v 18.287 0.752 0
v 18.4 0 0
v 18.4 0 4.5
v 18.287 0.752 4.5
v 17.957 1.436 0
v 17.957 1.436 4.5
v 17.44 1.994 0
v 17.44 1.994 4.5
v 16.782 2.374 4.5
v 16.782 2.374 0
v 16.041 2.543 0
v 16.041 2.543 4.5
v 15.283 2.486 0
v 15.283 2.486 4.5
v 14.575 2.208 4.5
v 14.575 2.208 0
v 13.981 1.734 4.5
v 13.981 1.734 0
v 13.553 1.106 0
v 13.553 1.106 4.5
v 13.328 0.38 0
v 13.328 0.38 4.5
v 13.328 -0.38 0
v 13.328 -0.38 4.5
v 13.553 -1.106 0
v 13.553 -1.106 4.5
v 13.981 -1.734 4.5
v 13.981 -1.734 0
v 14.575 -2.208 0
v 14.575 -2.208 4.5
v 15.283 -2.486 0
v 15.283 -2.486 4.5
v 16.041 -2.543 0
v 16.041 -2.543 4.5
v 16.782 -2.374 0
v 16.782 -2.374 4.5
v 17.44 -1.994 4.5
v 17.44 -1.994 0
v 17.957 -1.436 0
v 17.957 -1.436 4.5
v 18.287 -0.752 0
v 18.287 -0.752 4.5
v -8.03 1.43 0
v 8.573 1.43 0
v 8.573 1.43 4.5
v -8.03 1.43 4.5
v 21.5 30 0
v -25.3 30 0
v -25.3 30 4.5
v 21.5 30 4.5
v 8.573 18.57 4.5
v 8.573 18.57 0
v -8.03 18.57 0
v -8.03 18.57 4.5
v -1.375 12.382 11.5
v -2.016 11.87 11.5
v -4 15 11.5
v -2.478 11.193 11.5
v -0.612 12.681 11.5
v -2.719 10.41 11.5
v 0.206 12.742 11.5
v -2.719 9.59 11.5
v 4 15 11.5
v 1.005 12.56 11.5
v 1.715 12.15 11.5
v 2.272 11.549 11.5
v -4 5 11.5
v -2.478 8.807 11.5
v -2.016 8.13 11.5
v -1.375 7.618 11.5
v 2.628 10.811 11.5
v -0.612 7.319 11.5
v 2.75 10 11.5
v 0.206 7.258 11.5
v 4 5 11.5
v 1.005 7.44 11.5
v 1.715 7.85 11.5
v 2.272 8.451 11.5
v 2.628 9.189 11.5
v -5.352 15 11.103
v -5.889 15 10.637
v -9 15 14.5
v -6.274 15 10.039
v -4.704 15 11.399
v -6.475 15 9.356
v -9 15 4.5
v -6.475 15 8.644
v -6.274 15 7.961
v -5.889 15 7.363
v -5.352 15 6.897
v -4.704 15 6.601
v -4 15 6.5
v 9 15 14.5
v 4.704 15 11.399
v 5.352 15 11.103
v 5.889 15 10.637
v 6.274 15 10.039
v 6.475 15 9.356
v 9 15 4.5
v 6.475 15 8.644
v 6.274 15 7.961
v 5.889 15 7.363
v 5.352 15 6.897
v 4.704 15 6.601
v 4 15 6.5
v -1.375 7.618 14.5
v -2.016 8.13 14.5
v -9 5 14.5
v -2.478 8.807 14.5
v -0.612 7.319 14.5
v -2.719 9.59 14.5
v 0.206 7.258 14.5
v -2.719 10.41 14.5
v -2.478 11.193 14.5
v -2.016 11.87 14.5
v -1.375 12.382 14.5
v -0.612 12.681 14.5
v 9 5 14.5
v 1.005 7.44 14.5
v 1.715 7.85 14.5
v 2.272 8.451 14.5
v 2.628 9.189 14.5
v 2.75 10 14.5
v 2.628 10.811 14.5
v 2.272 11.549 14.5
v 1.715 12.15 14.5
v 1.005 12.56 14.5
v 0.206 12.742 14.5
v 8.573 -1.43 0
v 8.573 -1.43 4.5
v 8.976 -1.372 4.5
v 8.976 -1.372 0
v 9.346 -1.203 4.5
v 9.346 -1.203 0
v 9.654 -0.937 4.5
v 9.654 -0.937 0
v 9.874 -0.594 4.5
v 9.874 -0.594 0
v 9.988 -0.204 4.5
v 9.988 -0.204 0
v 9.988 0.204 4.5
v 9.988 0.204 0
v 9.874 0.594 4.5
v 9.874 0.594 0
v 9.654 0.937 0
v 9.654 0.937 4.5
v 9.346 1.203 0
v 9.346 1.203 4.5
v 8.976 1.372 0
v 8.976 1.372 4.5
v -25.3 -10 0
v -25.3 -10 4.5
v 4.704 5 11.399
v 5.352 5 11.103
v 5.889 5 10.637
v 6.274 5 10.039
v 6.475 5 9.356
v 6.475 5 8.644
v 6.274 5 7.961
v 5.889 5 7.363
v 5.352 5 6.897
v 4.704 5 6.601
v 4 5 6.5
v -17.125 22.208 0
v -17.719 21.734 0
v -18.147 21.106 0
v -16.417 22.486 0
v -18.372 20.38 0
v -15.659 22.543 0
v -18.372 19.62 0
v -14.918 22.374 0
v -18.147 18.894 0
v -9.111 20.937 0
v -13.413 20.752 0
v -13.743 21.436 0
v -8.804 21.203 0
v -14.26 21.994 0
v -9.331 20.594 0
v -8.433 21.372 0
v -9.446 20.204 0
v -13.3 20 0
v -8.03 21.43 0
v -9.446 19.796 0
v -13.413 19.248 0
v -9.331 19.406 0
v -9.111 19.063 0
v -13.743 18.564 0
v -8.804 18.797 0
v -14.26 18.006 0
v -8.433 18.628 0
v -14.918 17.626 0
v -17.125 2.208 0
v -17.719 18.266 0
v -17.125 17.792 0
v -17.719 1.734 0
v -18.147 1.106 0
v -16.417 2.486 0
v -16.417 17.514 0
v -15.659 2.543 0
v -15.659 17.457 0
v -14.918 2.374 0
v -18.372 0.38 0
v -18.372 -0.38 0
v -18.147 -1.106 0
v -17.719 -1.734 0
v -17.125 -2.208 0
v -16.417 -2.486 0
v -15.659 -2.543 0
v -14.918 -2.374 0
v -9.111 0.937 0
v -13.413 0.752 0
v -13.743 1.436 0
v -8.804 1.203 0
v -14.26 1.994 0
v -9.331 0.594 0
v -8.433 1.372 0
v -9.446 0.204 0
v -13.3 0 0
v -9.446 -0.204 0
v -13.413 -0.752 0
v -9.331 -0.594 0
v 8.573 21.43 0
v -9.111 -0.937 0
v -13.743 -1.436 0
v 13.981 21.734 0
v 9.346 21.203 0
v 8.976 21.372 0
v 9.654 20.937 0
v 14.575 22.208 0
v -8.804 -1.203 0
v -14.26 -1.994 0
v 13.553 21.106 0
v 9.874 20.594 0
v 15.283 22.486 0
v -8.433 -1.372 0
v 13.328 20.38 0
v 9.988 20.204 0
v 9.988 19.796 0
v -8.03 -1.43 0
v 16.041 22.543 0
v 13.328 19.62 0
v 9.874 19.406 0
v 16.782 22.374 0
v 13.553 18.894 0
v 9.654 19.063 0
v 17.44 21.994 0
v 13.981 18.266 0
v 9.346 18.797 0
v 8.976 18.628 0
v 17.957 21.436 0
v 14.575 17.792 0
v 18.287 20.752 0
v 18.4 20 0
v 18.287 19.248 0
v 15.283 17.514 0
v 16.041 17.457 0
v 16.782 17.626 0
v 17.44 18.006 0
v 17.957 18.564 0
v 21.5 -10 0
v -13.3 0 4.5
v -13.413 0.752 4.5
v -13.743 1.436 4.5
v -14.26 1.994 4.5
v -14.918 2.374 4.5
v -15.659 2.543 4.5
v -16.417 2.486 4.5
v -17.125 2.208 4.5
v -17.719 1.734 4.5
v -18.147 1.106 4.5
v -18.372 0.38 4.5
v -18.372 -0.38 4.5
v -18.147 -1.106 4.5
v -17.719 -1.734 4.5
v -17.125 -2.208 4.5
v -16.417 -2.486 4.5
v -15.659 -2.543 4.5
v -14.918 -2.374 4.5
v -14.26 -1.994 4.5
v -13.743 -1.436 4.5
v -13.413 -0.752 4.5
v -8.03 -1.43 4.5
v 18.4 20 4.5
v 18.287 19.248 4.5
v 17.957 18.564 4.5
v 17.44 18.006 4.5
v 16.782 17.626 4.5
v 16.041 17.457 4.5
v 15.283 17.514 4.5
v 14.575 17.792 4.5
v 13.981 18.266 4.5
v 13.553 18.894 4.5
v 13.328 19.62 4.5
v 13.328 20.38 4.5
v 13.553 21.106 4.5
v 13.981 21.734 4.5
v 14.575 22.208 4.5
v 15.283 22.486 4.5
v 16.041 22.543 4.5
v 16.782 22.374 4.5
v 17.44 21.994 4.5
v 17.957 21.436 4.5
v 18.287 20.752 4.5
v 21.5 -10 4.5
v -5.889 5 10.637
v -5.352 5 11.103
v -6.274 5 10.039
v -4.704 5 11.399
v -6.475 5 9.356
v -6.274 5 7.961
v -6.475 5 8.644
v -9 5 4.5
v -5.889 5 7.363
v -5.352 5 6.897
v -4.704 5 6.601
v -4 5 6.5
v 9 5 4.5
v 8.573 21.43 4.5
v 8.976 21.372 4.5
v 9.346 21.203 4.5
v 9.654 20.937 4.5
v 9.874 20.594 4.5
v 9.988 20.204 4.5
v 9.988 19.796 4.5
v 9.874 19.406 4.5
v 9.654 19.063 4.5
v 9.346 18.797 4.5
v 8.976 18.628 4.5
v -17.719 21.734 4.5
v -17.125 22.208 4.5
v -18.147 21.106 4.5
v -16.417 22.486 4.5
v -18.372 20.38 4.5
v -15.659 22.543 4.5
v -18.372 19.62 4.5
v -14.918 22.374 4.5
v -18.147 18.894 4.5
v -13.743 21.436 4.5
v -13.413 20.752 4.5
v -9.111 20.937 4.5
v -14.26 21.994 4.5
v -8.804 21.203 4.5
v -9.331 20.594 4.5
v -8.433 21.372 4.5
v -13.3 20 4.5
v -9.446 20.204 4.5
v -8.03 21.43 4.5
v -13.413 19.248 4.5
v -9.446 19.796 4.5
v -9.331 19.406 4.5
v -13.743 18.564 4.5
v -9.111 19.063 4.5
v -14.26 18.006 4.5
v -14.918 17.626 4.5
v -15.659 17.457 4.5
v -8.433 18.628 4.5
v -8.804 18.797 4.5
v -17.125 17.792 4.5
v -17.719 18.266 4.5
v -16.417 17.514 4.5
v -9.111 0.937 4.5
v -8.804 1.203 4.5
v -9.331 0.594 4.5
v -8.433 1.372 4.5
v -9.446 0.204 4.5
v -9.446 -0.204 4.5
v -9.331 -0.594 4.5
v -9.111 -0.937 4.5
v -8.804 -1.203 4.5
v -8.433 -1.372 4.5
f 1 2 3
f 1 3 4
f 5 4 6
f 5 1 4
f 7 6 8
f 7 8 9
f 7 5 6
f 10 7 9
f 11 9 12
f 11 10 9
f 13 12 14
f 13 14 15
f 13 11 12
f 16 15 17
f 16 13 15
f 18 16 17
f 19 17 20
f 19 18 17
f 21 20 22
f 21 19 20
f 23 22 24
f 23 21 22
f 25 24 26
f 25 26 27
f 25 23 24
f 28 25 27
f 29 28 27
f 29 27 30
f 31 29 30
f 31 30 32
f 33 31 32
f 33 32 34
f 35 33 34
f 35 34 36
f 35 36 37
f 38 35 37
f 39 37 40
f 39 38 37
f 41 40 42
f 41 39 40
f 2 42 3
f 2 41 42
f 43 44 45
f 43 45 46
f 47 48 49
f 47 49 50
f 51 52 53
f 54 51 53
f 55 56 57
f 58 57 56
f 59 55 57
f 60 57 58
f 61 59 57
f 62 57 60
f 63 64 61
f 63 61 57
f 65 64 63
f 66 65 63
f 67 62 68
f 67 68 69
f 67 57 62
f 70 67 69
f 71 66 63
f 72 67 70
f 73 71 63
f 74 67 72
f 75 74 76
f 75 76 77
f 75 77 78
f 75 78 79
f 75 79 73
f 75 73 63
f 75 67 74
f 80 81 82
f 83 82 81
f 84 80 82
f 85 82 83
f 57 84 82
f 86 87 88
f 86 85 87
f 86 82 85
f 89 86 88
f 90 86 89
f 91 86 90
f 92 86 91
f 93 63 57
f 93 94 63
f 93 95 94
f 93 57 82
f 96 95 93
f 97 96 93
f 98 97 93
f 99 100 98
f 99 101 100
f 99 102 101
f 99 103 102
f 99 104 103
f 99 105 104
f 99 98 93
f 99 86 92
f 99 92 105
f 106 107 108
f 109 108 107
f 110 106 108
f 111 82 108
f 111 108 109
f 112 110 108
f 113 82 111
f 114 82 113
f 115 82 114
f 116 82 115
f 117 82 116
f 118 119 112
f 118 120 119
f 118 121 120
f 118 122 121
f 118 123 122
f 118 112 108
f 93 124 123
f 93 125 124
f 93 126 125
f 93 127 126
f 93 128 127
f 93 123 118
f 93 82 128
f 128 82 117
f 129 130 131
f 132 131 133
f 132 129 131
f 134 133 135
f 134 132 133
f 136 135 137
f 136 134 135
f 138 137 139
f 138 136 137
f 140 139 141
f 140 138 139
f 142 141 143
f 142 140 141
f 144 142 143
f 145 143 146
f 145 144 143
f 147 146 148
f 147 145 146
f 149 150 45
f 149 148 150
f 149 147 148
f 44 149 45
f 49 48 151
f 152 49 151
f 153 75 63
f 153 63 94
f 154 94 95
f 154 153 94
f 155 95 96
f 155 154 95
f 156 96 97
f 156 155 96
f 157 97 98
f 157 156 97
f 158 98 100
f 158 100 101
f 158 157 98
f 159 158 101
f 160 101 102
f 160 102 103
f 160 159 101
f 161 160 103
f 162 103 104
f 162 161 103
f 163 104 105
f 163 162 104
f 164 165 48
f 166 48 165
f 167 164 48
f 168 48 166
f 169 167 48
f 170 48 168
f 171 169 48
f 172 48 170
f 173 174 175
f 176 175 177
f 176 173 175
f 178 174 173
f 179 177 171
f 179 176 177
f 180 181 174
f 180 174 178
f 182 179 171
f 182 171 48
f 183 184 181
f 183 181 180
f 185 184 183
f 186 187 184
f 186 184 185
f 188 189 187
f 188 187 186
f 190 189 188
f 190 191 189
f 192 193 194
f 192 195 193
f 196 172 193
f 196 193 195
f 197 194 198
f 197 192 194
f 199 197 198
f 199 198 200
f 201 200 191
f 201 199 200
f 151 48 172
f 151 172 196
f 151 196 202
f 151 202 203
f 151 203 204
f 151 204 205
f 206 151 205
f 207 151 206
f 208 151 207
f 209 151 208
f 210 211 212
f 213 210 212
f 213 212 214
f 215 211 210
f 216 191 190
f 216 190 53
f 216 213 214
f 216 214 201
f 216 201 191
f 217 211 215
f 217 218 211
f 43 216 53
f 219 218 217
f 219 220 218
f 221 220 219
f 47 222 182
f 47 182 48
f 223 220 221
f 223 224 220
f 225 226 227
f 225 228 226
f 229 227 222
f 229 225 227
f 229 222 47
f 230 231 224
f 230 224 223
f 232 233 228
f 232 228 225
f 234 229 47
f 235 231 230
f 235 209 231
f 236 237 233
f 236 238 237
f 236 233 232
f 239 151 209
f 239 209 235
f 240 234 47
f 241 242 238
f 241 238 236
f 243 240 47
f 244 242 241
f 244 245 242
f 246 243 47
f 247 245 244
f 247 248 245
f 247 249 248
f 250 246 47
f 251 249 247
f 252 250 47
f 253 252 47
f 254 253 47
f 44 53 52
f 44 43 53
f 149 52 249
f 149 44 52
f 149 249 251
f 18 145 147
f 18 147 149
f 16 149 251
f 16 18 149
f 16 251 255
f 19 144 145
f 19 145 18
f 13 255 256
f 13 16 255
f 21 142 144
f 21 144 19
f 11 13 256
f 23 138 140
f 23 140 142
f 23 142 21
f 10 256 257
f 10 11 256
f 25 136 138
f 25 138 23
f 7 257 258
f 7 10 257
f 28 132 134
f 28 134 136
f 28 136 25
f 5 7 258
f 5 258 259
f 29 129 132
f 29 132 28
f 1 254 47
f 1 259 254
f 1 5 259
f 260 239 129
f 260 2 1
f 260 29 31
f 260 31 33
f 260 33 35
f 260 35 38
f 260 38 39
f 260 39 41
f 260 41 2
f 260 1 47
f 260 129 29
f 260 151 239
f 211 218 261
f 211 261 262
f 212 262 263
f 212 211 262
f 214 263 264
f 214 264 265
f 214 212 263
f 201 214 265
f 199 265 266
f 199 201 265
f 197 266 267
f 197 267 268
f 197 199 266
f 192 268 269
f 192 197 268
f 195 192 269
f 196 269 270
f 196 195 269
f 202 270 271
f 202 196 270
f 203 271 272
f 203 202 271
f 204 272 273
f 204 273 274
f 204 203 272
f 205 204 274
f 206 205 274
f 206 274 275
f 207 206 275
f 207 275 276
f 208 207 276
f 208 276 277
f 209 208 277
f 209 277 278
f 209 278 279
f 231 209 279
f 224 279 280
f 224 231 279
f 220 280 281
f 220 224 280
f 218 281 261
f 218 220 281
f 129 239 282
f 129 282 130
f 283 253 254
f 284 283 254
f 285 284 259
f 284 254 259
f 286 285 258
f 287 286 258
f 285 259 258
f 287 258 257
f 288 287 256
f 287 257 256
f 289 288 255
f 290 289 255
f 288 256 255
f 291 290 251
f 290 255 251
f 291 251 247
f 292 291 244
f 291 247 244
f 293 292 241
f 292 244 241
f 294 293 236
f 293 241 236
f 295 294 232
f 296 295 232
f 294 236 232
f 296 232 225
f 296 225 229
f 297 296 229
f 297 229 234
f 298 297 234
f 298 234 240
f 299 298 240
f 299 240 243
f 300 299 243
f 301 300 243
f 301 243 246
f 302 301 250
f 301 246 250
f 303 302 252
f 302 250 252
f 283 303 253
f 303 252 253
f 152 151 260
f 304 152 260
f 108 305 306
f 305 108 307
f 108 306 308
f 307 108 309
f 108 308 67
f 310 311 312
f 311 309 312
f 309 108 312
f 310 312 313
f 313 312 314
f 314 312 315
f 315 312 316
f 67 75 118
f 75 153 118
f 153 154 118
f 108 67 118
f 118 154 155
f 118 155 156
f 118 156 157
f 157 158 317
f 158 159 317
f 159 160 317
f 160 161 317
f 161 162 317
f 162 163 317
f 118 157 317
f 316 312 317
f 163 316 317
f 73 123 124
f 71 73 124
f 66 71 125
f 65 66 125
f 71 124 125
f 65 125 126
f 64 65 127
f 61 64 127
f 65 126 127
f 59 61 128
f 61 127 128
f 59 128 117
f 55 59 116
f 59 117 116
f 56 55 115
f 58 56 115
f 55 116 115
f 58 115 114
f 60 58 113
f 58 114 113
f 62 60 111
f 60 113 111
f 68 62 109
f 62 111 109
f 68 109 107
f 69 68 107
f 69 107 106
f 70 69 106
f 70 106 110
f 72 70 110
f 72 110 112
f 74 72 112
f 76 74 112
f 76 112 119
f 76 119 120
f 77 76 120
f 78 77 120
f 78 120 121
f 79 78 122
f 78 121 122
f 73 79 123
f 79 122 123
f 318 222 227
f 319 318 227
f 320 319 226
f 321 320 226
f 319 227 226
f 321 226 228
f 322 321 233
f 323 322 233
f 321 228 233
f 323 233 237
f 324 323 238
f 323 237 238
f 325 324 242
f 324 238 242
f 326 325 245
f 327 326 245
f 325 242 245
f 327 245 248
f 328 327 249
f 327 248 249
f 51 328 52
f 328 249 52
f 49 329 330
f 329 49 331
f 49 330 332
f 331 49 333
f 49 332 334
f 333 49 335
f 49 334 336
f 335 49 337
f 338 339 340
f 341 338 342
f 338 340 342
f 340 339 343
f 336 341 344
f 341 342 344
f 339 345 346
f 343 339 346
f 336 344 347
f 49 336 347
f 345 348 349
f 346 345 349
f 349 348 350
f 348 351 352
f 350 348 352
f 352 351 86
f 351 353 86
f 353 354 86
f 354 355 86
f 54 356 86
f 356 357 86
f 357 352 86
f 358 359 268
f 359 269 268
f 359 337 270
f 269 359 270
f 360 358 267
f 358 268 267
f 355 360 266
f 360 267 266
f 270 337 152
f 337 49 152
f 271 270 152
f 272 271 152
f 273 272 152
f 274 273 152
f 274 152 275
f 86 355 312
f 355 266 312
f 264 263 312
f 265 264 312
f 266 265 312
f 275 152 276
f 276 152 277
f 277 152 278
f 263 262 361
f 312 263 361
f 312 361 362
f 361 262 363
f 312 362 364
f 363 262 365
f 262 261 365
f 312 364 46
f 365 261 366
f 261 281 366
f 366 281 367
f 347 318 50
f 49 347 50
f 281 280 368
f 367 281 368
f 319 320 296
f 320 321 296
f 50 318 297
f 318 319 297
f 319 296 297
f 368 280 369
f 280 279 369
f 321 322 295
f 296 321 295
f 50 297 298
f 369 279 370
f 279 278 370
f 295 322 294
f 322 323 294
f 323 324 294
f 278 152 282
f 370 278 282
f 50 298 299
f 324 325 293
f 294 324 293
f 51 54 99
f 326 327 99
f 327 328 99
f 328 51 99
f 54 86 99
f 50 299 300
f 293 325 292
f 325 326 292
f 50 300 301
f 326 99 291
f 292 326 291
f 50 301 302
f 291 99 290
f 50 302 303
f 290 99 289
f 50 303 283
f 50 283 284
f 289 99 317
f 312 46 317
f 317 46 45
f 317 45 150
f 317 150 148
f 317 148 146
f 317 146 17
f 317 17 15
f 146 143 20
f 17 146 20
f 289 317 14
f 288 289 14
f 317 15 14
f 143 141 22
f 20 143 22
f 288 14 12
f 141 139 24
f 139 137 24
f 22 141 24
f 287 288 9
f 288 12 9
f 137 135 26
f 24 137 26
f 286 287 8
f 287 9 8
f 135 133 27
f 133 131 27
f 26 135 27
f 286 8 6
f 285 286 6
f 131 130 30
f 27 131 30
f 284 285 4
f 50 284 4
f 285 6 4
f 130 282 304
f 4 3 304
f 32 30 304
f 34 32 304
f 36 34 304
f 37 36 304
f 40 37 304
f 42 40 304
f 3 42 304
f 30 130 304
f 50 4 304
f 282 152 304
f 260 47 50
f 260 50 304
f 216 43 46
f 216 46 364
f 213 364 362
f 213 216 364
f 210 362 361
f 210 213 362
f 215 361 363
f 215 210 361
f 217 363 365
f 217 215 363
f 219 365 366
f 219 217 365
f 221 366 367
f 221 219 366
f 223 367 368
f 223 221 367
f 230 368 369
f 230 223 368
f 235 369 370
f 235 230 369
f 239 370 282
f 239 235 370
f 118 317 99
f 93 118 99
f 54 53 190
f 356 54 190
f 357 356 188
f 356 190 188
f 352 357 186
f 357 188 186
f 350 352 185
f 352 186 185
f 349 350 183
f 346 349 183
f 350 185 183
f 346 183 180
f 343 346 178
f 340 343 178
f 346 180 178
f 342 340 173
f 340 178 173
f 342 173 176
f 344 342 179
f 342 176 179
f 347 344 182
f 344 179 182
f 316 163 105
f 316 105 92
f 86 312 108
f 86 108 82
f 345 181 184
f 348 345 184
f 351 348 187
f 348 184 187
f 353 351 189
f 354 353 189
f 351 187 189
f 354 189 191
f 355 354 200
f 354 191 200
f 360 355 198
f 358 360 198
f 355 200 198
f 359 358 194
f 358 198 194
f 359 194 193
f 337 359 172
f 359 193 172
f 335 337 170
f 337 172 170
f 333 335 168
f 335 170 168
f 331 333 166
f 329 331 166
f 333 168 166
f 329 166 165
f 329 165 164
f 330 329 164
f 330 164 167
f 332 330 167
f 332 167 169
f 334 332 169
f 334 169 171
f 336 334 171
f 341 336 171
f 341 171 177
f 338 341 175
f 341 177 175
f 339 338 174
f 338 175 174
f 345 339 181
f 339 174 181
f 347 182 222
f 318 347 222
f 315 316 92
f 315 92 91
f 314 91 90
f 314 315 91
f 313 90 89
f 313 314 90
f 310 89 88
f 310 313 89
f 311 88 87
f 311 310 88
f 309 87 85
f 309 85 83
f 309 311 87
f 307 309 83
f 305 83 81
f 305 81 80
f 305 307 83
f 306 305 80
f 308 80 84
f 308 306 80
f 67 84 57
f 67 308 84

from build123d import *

# Parameters (mm, degrees)
SKETCH_1_W          = 46.8
SKETCH_1_H          = 20
SKETCH_1_R          = 2.55
EXTRUDE_1_DEPTH     = 4.5
CUT_EXTRUDE_1_DEPTH = 8
SKETCH_9_W          = 18
SKETCH_9_H          = 10
EXTRUDE_2_DEPTH     = 10
CUT_EXTRUDE_3_DEPTH = 10
SKETCH_12_R         = 2.75
CUT_EXTRUDE_4_DEPTH = 3


with BuildPart() as part:
    # 草图1 → 凸台-拉伸1 (new body)
    with BuildSketch(Plane.XY):
        with Locations((-1.9, 0)):
            Rectangle(SKETCH_1_W, SKETCH_1_H)
        with Locations((-15.85, 0)):
            Circle(SKETCH_1_R, mode=Mode.SUBTRACT)
        with Locations((15.85, 0)):
            Circle(SKETCH_1_R, mode=Mode.SUBTRACT)
    extrude_1 = extrude(amount=EXTRUDE_1_DEPTH)

    # 草图8 → 切除-拉伸1 (cut)
    with BuildSketch(Plane(origin=(0, 0, 0), x_dir=(-1, 0, 0), z_dir=(0, 0, -1))):
        with BuildLine():
            Line((-8.572541507, 1.430395913), (8.030268199, 1.430395913))
            ThreePointArc((8.030268199, 1.430395913), (9.460664112, 0), (8.030268199, -1.430395913))
            Line((8.030268199, -1.430395913), (-8.572541507, -1.430395913))
            ThreePointArc((-8.572541507, -1.430395913), (-10.00293742, 0), (-8.572541507, 1.430395913))
        make_face()
    cut_extrude_1 = extrude(amount=-CUT_EXTRUDE_1_DEPTH, mode=Mode.SUBTRACT)

    # 镜向1: 凸台-拉伸1 across plane
    add(extrude_1.mirror(Plane.ZX.offset(10)))

    # 镜向3: 切除-拉伸1 across plane
    add(cut_extrude_1.mirror(Plane.ZX.offset(10)), mode=Mode.SUBTRACT)

    # 草图9 → 凸台-拉伸2 (add)
    with BuildSketch(Plane.XY.offset(4.5)):
        with Locations((0, 10)):
            Rectangle(SKETCH_9_W, SKETCH_9_H)
    extrude(amount=EXTRUDE_2_DEPTH)

    # 草图11 → 切除-拉伸3 (cut)
    with BuildSketch(Plane.XZ.offset(-5)):
        with BuildLine():
            Line((-4, 11.5), (4, 11.5))
            ThreePointArc((4, 11.5), (6.5, 9), (4, 6.5))
            Line((4, 6.5), (-4, 6.5))
            ThreePointArc((-4, 6.5), (-6.5, 9), (-4, 11.5))
        make_face()
    extrude(amount=-CUT_EXTRUDE_3_DEPTH, mode=Mode.SUBTRACT)

    # 草图12 → 切除-拉伸4 (cut)
    with BuildSketch(Plane.XY.offset(14.5)):
        with Locations((0, 10)):
            Circle(SKETCH_12_R)
    extrude(amount=-CUT_EXTRUDE_4_DEPTH, mode=Mode.SUBTRACT)


solid = part.part
